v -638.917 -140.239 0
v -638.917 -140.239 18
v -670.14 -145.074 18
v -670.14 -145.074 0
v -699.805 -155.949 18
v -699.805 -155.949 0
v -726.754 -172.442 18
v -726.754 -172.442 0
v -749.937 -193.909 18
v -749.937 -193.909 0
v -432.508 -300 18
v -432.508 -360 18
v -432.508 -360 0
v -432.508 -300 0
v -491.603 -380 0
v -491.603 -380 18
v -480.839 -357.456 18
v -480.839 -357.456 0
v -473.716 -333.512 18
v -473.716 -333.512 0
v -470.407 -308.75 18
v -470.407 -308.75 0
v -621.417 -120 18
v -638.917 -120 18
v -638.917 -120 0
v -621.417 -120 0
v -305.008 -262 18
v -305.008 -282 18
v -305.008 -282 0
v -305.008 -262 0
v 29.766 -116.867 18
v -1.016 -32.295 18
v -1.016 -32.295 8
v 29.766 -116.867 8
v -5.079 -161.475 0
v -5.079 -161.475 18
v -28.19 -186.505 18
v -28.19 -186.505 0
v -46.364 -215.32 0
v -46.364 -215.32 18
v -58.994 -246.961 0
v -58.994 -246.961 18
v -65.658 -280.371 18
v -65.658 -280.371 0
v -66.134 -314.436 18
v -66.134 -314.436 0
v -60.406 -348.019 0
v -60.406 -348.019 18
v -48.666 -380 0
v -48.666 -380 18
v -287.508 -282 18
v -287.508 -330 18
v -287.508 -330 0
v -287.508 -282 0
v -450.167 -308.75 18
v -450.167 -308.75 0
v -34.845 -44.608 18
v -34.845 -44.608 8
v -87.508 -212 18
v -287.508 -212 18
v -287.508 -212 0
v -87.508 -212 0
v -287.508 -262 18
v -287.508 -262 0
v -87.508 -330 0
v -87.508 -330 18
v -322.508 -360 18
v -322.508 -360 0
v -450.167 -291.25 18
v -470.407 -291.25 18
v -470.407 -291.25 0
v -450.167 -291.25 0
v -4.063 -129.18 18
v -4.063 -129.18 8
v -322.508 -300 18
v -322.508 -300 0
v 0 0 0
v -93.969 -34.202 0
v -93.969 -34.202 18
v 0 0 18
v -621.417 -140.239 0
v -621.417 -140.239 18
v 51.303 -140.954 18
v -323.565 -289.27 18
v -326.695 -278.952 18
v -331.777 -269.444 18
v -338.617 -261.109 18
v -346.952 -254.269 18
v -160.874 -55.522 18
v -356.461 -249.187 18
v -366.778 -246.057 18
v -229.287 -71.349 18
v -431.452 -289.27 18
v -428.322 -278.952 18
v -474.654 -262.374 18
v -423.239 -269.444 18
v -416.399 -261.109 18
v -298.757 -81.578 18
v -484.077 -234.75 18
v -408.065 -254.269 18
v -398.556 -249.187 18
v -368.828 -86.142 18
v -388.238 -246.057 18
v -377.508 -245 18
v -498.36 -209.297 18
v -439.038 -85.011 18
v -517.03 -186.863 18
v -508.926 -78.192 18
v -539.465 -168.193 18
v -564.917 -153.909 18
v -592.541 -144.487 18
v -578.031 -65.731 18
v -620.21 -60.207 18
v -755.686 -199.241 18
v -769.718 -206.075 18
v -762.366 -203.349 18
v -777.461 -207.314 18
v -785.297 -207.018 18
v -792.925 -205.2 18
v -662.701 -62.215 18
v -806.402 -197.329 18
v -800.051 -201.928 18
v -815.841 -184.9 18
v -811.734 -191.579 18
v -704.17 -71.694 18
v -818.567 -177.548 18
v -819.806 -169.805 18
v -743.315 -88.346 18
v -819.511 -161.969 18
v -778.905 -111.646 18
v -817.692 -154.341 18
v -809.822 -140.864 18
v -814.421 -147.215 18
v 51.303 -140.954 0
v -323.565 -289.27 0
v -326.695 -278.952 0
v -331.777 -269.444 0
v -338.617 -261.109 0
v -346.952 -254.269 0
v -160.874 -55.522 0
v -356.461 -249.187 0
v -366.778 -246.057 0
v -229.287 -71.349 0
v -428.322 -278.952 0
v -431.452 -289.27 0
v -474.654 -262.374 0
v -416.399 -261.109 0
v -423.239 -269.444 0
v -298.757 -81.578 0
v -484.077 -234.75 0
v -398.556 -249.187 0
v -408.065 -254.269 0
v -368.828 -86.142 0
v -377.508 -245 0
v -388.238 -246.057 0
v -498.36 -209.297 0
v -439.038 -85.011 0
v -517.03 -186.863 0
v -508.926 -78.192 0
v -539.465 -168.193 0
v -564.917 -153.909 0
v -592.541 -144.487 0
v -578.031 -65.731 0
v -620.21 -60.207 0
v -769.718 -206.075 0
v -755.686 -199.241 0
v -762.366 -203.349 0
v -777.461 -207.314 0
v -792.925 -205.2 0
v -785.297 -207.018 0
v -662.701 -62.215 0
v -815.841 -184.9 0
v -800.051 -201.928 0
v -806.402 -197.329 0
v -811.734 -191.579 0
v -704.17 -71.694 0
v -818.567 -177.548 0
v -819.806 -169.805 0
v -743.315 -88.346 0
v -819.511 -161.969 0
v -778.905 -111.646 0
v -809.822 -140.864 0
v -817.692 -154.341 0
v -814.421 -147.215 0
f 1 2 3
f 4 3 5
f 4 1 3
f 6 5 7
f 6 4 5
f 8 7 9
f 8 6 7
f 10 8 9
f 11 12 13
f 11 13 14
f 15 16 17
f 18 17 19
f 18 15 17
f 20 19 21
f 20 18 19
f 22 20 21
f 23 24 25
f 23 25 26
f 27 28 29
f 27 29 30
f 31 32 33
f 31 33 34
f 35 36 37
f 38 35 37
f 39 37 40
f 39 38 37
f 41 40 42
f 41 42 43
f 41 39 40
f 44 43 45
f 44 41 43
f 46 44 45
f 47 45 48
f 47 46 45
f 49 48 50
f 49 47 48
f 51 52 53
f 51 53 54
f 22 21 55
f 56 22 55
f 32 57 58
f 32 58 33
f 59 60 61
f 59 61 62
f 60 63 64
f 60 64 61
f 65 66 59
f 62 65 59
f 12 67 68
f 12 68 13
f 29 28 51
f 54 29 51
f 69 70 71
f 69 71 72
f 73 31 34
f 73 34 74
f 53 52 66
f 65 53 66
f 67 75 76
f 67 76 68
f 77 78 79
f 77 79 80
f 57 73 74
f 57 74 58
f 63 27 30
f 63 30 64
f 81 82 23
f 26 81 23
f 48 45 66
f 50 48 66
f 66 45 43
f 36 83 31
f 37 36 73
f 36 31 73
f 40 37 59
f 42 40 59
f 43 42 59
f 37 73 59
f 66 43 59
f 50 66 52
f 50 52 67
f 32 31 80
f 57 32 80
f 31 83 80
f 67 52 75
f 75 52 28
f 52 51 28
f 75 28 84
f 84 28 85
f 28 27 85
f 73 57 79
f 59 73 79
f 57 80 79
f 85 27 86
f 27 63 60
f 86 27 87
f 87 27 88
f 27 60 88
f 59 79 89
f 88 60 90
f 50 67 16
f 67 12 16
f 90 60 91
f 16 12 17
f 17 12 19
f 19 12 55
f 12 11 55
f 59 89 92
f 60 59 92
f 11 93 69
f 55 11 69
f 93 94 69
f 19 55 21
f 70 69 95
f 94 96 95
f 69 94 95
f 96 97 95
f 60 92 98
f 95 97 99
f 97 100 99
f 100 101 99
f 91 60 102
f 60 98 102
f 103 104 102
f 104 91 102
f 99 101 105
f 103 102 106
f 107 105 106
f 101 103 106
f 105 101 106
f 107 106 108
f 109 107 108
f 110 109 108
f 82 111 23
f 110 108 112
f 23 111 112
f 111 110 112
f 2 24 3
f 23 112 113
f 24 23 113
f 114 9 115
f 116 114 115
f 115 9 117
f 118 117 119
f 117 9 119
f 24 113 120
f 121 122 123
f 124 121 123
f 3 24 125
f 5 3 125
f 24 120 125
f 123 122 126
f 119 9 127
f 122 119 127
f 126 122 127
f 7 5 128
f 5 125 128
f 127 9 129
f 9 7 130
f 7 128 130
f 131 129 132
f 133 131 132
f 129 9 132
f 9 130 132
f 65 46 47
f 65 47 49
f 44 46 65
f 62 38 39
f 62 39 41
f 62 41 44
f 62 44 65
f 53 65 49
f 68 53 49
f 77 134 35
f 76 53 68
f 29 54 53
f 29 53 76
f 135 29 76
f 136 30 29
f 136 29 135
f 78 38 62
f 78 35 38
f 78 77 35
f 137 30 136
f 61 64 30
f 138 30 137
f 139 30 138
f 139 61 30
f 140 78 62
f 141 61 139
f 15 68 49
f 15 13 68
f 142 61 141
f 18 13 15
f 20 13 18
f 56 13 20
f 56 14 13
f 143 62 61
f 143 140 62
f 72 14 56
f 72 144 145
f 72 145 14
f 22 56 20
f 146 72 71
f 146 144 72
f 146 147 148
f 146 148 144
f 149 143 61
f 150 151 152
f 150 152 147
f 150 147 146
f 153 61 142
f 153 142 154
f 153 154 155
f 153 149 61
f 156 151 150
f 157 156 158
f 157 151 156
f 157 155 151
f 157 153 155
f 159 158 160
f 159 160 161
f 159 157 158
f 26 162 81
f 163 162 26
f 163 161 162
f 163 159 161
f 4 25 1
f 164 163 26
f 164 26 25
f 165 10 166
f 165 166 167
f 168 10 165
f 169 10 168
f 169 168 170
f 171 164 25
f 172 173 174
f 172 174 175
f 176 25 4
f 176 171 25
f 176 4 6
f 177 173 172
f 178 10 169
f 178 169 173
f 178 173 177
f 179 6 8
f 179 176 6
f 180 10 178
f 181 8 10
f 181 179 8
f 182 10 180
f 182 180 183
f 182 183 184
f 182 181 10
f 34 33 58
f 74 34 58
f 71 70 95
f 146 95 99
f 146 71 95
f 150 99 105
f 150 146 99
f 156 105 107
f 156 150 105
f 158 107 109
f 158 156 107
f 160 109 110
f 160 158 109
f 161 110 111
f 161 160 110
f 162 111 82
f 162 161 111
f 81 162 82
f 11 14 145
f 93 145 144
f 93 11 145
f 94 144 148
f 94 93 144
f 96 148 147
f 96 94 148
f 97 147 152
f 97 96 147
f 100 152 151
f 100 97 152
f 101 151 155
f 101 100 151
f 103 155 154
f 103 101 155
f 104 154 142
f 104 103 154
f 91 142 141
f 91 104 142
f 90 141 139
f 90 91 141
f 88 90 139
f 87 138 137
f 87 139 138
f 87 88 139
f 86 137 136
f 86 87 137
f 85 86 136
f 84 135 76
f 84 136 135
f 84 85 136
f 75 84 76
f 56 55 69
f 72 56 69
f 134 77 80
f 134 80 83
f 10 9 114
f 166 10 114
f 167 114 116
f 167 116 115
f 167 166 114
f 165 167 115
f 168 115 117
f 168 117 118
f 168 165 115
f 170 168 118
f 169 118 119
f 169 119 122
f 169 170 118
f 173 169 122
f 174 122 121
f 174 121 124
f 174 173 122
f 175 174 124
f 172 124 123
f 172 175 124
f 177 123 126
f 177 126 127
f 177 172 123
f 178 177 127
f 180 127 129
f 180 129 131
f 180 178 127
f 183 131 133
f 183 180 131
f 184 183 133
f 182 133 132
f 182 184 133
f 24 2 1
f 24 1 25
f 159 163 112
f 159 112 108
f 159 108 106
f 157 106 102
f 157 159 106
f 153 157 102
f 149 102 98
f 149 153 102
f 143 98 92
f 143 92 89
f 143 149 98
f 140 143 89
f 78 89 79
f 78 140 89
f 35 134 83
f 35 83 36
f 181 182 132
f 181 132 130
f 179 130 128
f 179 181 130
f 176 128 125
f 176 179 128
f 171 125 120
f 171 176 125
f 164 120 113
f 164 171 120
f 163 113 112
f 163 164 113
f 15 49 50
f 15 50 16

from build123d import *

# Parameters (mm, degrees)
BOSS_EXTRUDE1_DEPTH = 18
SKETCH2_W           = 200
SKETCH2_H           = 118
CUT_EXTRUDE1_DEPTH  = 19
CUT_EXTRUDE2_DEPTH  = 10
SKETCH4_W           = 17.5
SKETCH4_H           = 40
SKETCH4_W_2         = 40
SKETCH4_H_2         = 17.5
SKETCH4_H_3         = 20
CUT_EXTRUDE3_DEPTH  = 19


with BuildPart() as part:
    # Sketch1 → Boss-Extrude1 (new body)
    with BuildSketch(Plane.XY):
        with BuildLine():
            Line((0, 0), (51.303021499, -140.953893118))
            Line((51.303021499, -140.953893118), (-5.078535748, -161.475101717))
            ThreePointArc((-5.078535748, -161.475101717), (-63.089907624, -263.513472234), (-48.666413819, -380))
            Line((-48.666413819, -380), (-491.60308739, -380))
            ThreePointArc((-491.60308739, -380), (-536.64849181, -170.176041514), (-749.936822659, -193.909350133))
            ThreePointArc((-749.936822659, -193.909350133), (-806.401902791, -197.329105332), (-809.82165799, -140.864025199))
            ThreePointArc((-809.82165799, -140.864025199), (-704.170284695, -71.694204299), (-578.030994047, -65.731305902))
            ThreePointArc((-578.030994047, -65.731305902), (-333.746195792, -84.570747443), (-93.969262079, -34.202014333))
            Line((-93.969262079, -34.202014333), (0, 0))
        make_face()
    extrude(amount=BOSS_EXTRUDE1_DEPTH)

    # Sketch2 → Cut-Extrude1 (cut, through all)
    with BuildSketch(Plane.XY.offset(18)):
        with Locations((-187.508312236, -271)):
            Rectangle(SKETCH2_W, SKETCH2_H)
        with BuildLine():
            Line((-322.508312236, -360), (-432.508312236, -360))
            Line((-432.508312236, -360), (-432.508312236, -300))
            ThreePointArc((-432.508312236, -300), (-377.508312236, -245), (-322.508312236, -300))
            Line((-322.508312236, -300), (-322.508312236, -360))
        make_face()
    extrude(amount=-CUT_EXTRUDE1_DEPTH, mode=Mode.SUBTRACT)

    # Sketch3 → Cut-Extrude2 (cut)
    with BuildSketch(Plane.XY.offset(18)):
        Polygon((-1.01570715, -32.295020343), (29.76610575, -116.867356214), (-4.062828599, -129.180081374), (-34.844641498, -44.607745503), align=None)
    extrude(amount=-CUT_EXTRUDE2_DEPTH, mode=Mode.SUBTRACT)

    # Sketch4 → Cut-Extrude3 (cut, through all)
    with BuildSketch(Plane.XY.offset(18)):
        with Locations((-630.167151995, -140)):
            Rectangle(SKETCH4_W, SKETCH4_H)
        with Locations((-470.167151995, -300)):
            Rectangle(SKETCH4_W_2, SKETCH4_H_2)
        with Locations((-296.258312236, -272)):
            Rectangle(SKETCH4_W, SKETCH4_H_3)
    extrude(amount=-CUT_EXTRUDE3_DEPTH, mode=Mode.SUBTRACT)


solid = part.part
